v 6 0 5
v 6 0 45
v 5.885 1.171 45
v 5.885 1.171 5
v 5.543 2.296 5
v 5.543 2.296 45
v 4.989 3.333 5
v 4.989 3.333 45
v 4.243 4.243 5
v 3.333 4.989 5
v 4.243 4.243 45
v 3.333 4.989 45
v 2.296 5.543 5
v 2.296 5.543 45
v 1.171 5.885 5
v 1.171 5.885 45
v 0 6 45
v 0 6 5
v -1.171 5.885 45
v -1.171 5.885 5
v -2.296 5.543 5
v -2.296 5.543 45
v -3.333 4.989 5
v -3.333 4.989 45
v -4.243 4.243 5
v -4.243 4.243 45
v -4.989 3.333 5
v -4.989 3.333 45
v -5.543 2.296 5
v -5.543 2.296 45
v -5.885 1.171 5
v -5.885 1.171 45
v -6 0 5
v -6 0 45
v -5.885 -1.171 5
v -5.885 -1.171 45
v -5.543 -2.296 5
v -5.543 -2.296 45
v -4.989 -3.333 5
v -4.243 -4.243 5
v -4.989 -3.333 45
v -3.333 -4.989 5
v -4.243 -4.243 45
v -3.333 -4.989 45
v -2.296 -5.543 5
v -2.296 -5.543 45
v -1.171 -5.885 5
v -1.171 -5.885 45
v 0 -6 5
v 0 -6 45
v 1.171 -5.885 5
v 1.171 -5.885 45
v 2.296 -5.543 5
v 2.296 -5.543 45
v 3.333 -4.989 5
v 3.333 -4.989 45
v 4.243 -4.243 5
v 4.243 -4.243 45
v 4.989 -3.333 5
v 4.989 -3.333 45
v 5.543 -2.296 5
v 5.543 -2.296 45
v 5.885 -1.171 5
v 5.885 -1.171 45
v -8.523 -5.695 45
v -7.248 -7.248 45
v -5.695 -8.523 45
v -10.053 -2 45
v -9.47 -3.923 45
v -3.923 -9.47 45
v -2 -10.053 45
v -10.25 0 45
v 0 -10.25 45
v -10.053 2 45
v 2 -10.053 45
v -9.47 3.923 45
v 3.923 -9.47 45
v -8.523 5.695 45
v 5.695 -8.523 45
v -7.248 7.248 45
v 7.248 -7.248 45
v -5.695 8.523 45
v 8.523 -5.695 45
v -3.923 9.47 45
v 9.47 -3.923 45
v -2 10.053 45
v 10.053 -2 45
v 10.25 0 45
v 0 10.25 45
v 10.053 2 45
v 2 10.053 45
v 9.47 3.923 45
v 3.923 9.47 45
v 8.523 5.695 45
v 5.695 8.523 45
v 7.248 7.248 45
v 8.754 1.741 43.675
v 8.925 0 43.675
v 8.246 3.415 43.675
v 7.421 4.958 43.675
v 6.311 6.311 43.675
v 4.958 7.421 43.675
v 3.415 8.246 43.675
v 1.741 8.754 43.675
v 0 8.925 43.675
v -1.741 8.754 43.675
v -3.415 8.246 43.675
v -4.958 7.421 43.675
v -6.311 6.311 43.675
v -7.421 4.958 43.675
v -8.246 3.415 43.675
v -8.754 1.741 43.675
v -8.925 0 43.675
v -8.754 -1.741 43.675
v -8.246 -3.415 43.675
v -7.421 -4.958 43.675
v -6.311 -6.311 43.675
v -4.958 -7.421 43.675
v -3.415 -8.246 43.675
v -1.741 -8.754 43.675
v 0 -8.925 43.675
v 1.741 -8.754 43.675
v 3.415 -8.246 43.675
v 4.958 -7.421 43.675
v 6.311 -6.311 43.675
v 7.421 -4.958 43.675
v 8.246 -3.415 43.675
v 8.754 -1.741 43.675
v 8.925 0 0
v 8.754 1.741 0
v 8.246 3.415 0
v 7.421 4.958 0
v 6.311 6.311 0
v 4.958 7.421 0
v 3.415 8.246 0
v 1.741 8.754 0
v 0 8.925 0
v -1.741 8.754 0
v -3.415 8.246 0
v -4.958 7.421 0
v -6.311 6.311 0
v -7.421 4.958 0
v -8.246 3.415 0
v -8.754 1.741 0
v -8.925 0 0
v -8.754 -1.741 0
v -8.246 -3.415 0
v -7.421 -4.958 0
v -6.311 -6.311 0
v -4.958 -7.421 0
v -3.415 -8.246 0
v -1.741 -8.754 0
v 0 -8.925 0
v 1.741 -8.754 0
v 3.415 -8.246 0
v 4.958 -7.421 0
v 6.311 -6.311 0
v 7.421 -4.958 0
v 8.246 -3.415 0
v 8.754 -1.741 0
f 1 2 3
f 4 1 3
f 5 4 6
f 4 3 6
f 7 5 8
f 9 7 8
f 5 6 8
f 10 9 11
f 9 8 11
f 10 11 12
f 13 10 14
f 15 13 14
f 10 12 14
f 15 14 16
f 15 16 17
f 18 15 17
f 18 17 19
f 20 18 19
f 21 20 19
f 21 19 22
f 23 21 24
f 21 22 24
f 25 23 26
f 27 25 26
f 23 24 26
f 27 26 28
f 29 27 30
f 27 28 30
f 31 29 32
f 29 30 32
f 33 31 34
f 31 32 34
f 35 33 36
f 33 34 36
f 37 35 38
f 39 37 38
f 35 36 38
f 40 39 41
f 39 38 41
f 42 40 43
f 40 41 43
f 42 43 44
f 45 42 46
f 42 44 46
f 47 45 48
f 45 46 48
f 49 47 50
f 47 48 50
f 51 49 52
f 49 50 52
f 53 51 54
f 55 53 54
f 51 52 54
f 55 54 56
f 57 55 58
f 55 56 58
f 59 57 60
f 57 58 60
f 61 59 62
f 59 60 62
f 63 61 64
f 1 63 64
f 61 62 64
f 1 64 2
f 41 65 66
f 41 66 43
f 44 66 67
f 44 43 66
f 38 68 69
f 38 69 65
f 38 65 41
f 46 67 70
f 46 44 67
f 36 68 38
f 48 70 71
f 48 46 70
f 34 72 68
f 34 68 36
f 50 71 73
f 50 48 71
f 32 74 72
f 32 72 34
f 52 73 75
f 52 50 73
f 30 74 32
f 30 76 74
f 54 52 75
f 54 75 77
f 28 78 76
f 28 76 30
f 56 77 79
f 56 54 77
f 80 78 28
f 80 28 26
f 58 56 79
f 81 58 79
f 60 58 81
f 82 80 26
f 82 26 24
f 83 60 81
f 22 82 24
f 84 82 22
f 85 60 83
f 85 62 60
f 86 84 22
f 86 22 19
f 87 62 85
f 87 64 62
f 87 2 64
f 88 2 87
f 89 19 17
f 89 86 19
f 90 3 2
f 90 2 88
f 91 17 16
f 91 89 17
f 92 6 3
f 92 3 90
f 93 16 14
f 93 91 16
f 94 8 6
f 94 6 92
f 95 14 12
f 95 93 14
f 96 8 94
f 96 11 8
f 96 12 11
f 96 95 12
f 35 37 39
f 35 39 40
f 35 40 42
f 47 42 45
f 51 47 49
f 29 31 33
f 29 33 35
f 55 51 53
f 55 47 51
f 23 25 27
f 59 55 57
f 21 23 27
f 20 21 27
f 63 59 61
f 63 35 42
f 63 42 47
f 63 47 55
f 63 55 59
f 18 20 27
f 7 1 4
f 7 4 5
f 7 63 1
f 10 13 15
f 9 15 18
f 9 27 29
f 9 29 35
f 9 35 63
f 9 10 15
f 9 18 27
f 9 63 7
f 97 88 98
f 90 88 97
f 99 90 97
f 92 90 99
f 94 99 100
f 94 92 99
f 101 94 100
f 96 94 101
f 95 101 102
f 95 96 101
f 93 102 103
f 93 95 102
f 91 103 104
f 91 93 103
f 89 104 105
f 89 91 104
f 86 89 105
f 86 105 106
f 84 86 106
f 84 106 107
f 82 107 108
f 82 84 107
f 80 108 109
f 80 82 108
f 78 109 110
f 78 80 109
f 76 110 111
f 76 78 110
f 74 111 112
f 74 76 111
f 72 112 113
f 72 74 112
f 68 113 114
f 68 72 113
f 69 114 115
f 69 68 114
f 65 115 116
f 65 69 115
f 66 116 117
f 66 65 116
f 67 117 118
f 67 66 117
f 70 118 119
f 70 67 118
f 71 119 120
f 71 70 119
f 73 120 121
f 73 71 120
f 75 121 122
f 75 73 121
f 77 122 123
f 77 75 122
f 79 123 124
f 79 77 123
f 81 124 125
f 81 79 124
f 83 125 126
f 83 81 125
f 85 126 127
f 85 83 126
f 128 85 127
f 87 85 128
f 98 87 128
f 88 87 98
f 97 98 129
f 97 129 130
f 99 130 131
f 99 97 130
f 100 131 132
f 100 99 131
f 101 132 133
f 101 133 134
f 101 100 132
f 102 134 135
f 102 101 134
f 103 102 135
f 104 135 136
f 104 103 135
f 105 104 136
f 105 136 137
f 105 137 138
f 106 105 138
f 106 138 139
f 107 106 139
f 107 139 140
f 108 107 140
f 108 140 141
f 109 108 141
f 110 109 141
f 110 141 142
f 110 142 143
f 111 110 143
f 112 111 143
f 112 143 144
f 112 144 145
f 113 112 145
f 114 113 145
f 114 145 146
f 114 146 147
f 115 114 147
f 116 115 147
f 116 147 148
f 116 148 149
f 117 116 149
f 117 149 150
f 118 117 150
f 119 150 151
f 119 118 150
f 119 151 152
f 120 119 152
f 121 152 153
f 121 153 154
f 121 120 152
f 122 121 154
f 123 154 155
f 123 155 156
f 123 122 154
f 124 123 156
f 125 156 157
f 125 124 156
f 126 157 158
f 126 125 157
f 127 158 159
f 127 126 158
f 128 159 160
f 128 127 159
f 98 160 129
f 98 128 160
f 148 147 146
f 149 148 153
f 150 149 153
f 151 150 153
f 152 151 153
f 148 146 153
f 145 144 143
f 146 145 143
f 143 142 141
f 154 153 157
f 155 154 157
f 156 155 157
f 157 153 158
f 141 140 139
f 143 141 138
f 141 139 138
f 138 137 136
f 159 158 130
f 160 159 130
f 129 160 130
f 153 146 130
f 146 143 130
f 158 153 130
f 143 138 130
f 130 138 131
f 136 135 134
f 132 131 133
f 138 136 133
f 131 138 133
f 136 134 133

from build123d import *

# Parameters (mm, degrees)
F0_R        = 8.925
F1_DEPTH    = 45
F2_R        = 6
F3_DEPTH    = 40
F4_R        = 10.25
F4_R_2      = 8.925
F5_DEPTH    = 1.5
F6_S5_R     = 8.925
F6_T6_DEPTH = 16


# Not quite as in the source:
# - a fillet or chamfer that OpenCascade refuses, or shapes differently, is made with other operations: its cross-section is extruded or revolved along the edge and cut away or added


with BuildPart() as f1:
    # F0 (on Top) → F1 (new body)
    with BuildSketch(Plane.XY):
        Circle(F0_R)
    extrude(amount=F1_DEPTH)

    # F2 (on face) → F3 (cut)
    with BuildSketch(Plane.XY.offset(45)):
        Circle(F2_R)
    extrude(amount=-F3_DEPTH, mode=Mode.SUBTRACT)

    # F4 (on face) → F5 (join)
    with BuildSketch(Plane.XY.offset(45)):
        Circle(F4_R)
        Circle(F4_R_2, mode=Mode.SUBTRACT)
    extrude(amount=-F5_DEPTH)

    # F6: chamfer of 1.5 on 1 edges, made by hand


with BuildPart() as f6_tool2:
    # F6_s3 → F6_t4 (revolve)
    with BuildSketch(Plane.XZ):
        Polygon((8.75, 43.5), (10.25, 45), (10.25, 43.5), align=None)
    revolve(axis=Axis((0, 0, 43.5), (0, 0, 1)))

    # F6_s5 → F6_t6 (cut, symmetric)
    with BuildSketch(Plane.XY.offset(44.2)):
        Circle(F6_S5_R)
    extrude(amount=F6_T6_DEPTH, both=True, mode=Mode.SUBTRACT)


with BuildPart() as f1_1:
    add(f1.part)

    # F6_t1: cut F6_tool2
    add(f6_tool2.part, mode=Mode.SUBTRACT)


solid = f1_1.part
